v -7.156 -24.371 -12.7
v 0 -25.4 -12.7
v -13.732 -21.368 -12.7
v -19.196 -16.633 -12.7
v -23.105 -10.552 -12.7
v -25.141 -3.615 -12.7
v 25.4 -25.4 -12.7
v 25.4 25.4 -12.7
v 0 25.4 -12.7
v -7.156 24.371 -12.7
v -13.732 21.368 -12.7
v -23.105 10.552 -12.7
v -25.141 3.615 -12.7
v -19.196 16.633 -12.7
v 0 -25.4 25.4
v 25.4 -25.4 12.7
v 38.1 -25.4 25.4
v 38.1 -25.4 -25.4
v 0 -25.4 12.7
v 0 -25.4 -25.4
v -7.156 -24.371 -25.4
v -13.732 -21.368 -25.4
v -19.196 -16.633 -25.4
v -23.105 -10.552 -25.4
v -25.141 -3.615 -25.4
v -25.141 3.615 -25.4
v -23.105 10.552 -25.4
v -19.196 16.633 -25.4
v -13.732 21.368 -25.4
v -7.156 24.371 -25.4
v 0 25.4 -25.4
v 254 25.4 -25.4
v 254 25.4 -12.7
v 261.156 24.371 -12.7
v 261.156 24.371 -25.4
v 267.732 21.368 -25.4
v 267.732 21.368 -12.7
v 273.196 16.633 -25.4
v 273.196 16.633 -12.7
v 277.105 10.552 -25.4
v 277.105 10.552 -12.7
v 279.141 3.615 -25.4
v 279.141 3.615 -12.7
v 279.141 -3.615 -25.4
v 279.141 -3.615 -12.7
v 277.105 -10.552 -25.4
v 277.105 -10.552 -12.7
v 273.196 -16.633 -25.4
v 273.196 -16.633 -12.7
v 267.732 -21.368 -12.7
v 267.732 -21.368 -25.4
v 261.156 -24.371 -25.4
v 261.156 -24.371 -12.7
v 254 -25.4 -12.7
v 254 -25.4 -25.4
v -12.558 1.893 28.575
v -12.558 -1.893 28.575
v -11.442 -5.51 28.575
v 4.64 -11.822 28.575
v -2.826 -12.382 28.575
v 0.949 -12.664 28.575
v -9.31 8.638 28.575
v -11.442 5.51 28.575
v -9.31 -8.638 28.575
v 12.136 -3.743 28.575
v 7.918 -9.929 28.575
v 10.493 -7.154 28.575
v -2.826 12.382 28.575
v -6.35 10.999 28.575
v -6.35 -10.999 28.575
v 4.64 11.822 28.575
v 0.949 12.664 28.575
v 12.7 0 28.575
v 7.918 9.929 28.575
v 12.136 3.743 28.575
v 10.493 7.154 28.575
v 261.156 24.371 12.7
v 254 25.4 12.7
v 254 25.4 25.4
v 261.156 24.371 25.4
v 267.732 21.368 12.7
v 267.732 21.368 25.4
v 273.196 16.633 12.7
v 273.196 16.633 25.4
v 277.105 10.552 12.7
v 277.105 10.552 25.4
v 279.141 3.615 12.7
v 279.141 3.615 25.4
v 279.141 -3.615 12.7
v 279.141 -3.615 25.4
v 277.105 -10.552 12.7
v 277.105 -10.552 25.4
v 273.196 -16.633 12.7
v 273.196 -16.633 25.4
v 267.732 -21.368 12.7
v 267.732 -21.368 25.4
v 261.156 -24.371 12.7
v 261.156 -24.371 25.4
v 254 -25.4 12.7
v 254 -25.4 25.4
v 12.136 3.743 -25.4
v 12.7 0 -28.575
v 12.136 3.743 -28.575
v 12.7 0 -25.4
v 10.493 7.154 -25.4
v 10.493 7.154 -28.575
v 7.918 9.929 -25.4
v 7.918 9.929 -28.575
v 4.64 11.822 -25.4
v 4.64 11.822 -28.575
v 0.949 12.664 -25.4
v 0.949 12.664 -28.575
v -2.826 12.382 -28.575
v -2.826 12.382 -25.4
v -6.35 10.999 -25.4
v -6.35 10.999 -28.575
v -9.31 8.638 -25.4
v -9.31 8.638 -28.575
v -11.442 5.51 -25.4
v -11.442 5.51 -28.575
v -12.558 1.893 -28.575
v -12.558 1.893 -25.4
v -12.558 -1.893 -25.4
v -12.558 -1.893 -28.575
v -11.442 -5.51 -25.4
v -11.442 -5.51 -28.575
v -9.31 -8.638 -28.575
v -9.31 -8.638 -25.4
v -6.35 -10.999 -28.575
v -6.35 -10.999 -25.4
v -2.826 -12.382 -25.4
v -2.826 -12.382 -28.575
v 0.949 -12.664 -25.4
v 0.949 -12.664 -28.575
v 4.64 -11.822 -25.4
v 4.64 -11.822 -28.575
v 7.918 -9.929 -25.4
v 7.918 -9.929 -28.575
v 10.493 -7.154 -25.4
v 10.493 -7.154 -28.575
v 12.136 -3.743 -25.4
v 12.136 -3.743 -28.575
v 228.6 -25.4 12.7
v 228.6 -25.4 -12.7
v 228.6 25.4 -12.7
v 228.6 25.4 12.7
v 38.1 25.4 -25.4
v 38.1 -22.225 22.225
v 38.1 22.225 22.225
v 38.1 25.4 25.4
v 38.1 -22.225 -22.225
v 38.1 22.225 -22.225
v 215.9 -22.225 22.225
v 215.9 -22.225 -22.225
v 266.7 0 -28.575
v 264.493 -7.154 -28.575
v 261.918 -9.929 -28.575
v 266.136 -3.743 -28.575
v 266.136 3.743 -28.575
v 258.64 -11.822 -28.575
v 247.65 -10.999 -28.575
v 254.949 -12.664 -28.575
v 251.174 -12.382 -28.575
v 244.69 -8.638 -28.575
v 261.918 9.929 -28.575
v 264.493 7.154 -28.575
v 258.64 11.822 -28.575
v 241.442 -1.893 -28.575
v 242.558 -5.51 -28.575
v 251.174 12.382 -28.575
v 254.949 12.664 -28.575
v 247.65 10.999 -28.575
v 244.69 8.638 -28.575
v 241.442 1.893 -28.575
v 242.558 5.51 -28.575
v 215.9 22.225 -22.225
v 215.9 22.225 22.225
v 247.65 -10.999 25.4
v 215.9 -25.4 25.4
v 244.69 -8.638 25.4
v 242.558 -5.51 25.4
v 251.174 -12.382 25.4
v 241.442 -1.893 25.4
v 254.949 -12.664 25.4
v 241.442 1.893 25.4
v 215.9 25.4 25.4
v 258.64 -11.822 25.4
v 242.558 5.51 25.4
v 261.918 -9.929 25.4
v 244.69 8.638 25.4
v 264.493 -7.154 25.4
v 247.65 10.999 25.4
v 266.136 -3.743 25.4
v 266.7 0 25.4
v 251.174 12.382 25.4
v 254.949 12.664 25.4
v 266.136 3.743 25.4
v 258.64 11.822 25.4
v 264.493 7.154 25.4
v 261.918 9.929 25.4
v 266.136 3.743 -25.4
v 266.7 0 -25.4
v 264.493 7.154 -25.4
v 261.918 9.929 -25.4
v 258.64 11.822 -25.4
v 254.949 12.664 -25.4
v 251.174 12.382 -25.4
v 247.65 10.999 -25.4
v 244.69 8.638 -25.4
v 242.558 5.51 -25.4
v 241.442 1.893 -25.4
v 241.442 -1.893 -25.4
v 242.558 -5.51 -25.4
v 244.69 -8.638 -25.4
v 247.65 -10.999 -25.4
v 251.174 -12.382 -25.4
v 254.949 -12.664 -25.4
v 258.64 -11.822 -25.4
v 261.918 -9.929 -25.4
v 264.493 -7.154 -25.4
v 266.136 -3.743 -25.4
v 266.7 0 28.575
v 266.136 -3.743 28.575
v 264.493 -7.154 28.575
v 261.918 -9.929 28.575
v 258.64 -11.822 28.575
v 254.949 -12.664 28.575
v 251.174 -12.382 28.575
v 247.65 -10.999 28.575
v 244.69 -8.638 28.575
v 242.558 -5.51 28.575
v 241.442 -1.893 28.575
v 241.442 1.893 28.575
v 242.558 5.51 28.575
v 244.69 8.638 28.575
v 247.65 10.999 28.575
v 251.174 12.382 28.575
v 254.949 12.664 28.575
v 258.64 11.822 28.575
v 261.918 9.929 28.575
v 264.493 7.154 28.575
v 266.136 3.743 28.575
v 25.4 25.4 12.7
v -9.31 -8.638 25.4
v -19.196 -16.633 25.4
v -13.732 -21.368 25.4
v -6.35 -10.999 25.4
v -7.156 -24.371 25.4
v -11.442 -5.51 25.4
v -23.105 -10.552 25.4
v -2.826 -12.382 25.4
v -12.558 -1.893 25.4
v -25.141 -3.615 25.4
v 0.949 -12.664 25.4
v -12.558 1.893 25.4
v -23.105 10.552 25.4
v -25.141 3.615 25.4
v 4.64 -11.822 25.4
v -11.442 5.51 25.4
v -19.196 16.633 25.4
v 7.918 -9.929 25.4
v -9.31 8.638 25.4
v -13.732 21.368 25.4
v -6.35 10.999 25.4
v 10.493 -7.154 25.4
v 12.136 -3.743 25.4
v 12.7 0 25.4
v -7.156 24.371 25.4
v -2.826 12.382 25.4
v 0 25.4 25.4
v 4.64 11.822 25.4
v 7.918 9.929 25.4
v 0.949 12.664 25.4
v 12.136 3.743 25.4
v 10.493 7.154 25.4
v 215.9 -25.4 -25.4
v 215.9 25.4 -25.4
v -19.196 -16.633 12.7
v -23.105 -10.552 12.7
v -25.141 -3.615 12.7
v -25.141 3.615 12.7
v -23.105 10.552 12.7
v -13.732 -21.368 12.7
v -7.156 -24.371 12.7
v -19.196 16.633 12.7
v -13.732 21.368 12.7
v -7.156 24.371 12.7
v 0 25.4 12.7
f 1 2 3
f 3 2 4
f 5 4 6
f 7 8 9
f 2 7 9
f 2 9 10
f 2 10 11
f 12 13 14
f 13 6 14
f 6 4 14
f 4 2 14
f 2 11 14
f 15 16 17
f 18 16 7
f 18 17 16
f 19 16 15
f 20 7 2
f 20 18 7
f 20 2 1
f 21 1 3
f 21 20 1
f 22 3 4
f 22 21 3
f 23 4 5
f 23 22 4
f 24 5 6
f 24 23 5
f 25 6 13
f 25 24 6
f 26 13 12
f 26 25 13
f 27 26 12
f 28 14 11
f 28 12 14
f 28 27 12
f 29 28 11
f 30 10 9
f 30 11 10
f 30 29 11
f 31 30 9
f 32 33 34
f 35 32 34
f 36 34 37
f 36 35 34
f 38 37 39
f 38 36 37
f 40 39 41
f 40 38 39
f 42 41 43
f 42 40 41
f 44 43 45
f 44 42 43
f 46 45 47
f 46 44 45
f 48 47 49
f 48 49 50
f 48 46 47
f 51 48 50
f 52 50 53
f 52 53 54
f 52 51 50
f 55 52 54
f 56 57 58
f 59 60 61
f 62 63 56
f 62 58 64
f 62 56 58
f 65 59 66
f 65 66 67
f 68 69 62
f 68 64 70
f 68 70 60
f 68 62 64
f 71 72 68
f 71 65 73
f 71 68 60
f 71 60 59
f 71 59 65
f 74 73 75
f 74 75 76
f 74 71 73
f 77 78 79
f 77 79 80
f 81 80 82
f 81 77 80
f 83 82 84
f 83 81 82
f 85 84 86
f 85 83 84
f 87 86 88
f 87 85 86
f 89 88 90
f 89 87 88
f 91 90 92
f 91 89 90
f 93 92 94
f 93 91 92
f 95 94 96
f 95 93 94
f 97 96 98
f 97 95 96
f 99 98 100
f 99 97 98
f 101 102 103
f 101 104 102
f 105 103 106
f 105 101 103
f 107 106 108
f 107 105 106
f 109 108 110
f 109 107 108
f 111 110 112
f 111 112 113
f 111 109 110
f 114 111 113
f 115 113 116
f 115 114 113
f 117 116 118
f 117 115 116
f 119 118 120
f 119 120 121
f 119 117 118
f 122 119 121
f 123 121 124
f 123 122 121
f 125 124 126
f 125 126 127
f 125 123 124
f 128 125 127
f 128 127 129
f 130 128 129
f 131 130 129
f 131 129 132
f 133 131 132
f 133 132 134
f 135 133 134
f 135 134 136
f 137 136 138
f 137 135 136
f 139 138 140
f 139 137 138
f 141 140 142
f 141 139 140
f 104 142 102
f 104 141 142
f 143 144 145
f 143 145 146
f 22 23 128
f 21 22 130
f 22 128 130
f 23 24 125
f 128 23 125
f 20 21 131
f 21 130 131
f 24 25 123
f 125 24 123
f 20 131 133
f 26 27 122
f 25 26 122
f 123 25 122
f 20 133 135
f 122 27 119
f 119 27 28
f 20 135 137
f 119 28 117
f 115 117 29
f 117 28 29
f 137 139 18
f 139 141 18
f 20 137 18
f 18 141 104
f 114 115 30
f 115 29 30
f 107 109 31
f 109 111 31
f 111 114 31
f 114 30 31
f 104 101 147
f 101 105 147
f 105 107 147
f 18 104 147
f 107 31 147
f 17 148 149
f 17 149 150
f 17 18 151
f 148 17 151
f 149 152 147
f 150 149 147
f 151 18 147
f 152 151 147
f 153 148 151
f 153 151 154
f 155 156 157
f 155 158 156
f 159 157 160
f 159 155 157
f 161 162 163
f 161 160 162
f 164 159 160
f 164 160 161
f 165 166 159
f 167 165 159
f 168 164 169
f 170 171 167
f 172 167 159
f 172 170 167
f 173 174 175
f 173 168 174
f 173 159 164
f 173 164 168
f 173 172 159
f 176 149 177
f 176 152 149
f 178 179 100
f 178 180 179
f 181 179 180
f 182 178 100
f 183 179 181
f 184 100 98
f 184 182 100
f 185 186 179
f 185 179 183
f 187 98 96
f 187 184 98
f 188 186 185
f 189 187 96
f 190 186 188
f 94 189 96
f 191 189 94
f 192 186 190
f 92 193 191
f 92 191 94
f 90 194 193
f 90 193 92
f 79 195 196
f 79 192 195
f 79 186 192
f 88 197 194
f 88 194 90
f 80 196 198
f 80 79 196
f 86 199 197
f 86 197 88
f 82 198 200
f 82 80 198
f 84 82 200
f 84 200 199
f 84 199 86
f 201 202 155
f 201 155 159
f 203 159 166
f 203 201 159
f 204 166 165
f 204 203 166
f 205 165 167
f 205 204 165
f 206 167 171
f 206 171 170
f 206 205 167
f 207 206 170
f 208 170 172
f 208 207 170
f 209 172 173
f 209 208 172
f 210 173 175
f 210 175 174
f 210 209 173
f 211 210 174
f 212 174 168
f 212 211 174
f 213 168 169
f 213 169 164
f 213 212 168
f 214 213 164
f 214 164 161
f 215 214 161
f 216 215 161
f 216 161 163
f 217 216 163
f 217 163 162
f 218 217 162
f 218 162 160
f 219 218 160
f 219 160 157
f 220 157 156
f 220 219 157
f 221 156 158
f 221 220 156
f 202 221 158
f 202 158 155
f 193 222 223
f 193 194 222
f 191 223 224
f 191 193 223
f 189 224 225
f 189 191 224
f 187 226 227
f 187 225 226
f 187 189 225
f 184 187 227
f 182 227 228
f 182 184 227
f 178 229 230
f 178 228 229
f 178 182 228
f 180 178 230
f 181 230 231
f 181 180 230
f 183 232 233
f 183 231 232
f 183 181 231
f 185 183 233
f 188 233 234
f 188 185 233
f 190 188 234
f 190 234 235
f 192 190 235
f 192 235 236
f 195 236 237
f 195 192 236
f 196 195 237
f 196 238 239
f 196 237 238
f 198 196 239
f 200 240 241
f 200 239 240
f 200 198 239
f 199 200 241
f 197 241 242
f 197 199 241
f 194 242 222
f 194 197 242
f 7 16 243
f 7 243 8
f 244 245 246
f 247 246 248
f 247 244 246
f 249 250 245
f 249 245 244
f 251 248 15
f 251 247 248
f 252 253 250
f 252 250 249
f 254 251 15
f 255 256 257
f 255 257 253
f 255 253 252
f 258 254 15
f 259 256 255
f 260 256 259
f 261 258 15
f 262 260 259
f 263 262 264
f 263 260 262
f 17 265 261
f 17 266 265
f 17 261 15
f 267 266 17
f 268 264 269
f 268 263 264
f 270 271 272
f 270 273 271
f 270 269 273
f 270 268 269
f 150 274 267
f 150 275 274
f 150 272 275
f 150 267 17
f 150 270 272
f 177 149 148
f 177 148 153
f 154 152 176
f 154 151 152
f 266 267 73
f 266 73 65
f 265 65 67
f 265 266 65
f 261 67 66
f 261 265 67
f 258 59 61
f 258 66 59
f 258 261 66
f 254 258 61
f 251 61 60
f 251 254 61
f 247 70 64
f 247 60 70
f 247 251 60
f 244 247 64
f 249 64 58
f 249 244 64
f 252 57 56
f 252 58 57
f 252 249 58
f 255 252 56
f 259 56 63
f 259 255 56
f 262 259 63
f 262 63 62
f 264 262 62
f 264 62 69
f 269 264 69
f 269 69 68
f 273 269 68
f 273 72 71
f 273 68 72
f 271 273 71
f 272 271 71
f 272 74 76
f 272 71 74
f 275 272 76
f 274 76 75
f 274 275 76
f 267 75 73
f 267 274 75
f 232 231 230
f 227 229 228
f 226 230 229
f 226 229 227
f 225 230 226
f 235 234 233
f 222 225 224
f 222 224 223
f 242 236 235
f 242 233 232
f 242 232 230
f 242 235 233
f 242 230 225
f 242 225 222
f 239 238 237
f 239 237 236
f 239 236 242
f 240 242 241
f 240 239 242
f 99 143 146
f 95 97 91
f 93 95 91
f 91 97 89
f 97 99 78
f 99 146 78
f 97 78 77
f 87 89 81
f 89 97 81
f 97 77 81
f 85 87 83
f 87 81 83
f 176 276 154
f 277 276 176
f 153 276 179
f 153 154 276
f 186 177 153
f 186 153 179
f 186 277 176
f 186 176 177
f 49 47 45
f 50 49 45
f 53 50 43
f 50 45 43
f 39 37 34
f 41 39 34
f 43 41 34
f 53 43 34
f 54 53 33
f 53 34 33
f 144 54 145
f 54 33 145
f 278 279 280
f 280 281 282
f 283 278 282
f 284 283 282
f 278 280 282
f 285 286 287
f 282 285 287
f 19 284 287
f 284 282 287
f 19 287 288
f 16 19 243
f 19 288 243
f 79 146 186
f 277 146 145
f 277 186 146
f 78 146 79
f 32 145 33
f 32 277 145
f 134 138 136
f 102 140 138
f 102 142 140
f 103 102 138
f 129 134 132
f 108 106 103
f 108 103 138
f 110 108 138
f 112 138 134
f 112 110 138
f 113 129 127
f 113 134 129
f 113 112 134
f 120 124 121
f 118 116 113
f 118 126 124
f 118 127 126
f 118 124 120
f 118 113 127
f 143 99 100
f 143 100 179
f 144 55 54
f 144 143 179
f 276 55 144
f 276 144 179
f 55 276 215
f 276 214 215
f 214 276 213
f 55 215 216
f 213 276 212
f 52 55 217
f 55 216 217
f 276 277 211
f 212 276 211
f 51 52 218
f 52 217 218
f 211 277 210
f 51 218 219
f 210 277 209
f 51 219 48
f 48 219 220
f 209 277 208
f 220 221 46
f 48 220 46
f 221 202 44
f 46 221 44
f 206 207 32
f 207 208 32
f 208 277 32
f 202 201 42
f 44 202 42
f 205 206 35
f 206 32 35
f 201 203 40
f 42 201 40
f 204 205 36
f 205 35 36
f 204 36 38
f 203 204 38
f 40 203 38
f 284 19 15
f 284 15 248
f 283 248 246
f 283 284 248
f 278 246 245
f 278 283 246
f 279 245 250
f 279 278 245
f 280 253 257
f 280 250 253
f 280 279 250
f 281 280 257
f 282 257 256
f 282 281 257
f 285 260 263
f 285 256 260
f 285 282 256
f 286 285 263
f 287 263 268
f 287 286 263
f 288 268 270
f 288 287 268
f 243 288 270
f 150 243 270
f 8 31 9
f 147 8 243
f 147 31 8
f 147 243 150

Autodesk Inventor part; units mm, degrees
sketch "Sketch1" plane through (0, 0, 0) normal (0, 0, 1) x (1, 0, 0)
  line L0 (0, 25.4) -> (254, 25.4)
  line L1 (254, 25.4) -> (254, -25.4)
  line L2 (254, -25.4) -> (0, -25.4)
  line L3 (0, -25.4) -> (0, 25.4)
  circle A0 centre (0, 0) radius 25.4
  circle A1 centre (254, 0) radius 25.4
  dimension "d0" = 254
  dimension "d1" = 50.8
extrude "Extrusion1" add sketch "Sketch1" along normal mid plane 50.8
sketch "Sketch2" plane through (0, 25.4, 25.4) normal (0, 1, 0) x (1, 0, 0)
  line L0 (-25.4, 50.8) -> (-25.4, 0) projected
  line L1 (-25.4, 50.8) -> (0, 50.8) projected
  line L2 (0, 0) -> (-25.4, 0) projected
  line L3 (0, 0) -> (254, 0) projected
  line L4 (254, 50.8) -> (0, 50.8) projected
  line L5 (-25.4, 12.7) -> (25.4, 12.7)
  line L6 (25.4, 12.7) -> (25.4, 38.1)
  line L7 (25.4, 38.1) -> (-25.4, 38.1)
  line L8 (-25.4, 38.1) -> (-25.4, 12.7)
  point P0 (-25.4, 25.4)
  point P1 (-25.4, 25.4)
  dimension "d4" = 25.4
  dimension "d10" = 50.8
extrude "Extrusion2" cut sketch "Sketch2" against normal through all
ref_plane "Work Plane1" through (279.4, 0, 0) normal (1, 0, 0) x (0, 1, 0)
ref_plane "Work Plane2" through (-25.4, 0, 0) normal (1, 0, 0) x (0, 1, 0)
ref_plane "Work Plane3" through (127, 0, 0) normal (1, 0, 0) x (0, 1, 0)
sketch "Sketch5" plane through (0, 0, 25.4) normal (0, 0, 1) x (1, 0, 0)
  arc A0 (254, -25.4) -> (254, 25.4) centre (254, 0) ccw projected
  line L0 (0, 25.4) -> (254, 25.4) projected
  arc A1 (0, 25.4) -> (0, -25.4) centre (0, 0) ccw projected
  line L1 (254, -25.4) -> (0, -25.4) projected
  circle A2 centre (0, 0) radius 25.4 construction
  circle A3 centre (254, 0) radius 25.4 construction
  line L2 (38.1, 25.4) -> (38.1, -25.4)
  line L3 (215.9, 25.4) -> (215.9, -25.4)
  dimension "d11" = 12.7
  dimension "d13" = 12.7
extrude "Extrusion4" cut sketch "Sketch5" against normal blind 3.175 contours L1 L2 L0 L3
pattern_circular "Circular Pattern1" count 4 over 360 about axis through (-10, 0, 0) along (1, 0, 0) of "Extrusion4"
mirror "Mirror1" about plane through (127, 0, 0) normal (1, 0, 0) of "Extrusion2"
sketch "Sketch3" plane through (0, 0, 25.4) normal (0, 0, 1) x (1, 0, 0)
  arc A0 (0, 25.4) -> (0, -25.4) centre (0, 0) ccw projected
  arc A1 (254, -25.4) -> (254, 25.4) centre (254, 0) ccw projected
  circle A2 centre (0, 0) radius 12.7
  circle A3 centre (254, 0) radius 12.7
  dimension "d7" = 25.4
extrude "Extrusion3" add sketch "Sketch3" along normal blind 3.175
mirror "Mirror2" about plane through (0, 0, 0) normal (0, 0, 1) of "Extrusion3"
equation "\"d13\" = d11"
